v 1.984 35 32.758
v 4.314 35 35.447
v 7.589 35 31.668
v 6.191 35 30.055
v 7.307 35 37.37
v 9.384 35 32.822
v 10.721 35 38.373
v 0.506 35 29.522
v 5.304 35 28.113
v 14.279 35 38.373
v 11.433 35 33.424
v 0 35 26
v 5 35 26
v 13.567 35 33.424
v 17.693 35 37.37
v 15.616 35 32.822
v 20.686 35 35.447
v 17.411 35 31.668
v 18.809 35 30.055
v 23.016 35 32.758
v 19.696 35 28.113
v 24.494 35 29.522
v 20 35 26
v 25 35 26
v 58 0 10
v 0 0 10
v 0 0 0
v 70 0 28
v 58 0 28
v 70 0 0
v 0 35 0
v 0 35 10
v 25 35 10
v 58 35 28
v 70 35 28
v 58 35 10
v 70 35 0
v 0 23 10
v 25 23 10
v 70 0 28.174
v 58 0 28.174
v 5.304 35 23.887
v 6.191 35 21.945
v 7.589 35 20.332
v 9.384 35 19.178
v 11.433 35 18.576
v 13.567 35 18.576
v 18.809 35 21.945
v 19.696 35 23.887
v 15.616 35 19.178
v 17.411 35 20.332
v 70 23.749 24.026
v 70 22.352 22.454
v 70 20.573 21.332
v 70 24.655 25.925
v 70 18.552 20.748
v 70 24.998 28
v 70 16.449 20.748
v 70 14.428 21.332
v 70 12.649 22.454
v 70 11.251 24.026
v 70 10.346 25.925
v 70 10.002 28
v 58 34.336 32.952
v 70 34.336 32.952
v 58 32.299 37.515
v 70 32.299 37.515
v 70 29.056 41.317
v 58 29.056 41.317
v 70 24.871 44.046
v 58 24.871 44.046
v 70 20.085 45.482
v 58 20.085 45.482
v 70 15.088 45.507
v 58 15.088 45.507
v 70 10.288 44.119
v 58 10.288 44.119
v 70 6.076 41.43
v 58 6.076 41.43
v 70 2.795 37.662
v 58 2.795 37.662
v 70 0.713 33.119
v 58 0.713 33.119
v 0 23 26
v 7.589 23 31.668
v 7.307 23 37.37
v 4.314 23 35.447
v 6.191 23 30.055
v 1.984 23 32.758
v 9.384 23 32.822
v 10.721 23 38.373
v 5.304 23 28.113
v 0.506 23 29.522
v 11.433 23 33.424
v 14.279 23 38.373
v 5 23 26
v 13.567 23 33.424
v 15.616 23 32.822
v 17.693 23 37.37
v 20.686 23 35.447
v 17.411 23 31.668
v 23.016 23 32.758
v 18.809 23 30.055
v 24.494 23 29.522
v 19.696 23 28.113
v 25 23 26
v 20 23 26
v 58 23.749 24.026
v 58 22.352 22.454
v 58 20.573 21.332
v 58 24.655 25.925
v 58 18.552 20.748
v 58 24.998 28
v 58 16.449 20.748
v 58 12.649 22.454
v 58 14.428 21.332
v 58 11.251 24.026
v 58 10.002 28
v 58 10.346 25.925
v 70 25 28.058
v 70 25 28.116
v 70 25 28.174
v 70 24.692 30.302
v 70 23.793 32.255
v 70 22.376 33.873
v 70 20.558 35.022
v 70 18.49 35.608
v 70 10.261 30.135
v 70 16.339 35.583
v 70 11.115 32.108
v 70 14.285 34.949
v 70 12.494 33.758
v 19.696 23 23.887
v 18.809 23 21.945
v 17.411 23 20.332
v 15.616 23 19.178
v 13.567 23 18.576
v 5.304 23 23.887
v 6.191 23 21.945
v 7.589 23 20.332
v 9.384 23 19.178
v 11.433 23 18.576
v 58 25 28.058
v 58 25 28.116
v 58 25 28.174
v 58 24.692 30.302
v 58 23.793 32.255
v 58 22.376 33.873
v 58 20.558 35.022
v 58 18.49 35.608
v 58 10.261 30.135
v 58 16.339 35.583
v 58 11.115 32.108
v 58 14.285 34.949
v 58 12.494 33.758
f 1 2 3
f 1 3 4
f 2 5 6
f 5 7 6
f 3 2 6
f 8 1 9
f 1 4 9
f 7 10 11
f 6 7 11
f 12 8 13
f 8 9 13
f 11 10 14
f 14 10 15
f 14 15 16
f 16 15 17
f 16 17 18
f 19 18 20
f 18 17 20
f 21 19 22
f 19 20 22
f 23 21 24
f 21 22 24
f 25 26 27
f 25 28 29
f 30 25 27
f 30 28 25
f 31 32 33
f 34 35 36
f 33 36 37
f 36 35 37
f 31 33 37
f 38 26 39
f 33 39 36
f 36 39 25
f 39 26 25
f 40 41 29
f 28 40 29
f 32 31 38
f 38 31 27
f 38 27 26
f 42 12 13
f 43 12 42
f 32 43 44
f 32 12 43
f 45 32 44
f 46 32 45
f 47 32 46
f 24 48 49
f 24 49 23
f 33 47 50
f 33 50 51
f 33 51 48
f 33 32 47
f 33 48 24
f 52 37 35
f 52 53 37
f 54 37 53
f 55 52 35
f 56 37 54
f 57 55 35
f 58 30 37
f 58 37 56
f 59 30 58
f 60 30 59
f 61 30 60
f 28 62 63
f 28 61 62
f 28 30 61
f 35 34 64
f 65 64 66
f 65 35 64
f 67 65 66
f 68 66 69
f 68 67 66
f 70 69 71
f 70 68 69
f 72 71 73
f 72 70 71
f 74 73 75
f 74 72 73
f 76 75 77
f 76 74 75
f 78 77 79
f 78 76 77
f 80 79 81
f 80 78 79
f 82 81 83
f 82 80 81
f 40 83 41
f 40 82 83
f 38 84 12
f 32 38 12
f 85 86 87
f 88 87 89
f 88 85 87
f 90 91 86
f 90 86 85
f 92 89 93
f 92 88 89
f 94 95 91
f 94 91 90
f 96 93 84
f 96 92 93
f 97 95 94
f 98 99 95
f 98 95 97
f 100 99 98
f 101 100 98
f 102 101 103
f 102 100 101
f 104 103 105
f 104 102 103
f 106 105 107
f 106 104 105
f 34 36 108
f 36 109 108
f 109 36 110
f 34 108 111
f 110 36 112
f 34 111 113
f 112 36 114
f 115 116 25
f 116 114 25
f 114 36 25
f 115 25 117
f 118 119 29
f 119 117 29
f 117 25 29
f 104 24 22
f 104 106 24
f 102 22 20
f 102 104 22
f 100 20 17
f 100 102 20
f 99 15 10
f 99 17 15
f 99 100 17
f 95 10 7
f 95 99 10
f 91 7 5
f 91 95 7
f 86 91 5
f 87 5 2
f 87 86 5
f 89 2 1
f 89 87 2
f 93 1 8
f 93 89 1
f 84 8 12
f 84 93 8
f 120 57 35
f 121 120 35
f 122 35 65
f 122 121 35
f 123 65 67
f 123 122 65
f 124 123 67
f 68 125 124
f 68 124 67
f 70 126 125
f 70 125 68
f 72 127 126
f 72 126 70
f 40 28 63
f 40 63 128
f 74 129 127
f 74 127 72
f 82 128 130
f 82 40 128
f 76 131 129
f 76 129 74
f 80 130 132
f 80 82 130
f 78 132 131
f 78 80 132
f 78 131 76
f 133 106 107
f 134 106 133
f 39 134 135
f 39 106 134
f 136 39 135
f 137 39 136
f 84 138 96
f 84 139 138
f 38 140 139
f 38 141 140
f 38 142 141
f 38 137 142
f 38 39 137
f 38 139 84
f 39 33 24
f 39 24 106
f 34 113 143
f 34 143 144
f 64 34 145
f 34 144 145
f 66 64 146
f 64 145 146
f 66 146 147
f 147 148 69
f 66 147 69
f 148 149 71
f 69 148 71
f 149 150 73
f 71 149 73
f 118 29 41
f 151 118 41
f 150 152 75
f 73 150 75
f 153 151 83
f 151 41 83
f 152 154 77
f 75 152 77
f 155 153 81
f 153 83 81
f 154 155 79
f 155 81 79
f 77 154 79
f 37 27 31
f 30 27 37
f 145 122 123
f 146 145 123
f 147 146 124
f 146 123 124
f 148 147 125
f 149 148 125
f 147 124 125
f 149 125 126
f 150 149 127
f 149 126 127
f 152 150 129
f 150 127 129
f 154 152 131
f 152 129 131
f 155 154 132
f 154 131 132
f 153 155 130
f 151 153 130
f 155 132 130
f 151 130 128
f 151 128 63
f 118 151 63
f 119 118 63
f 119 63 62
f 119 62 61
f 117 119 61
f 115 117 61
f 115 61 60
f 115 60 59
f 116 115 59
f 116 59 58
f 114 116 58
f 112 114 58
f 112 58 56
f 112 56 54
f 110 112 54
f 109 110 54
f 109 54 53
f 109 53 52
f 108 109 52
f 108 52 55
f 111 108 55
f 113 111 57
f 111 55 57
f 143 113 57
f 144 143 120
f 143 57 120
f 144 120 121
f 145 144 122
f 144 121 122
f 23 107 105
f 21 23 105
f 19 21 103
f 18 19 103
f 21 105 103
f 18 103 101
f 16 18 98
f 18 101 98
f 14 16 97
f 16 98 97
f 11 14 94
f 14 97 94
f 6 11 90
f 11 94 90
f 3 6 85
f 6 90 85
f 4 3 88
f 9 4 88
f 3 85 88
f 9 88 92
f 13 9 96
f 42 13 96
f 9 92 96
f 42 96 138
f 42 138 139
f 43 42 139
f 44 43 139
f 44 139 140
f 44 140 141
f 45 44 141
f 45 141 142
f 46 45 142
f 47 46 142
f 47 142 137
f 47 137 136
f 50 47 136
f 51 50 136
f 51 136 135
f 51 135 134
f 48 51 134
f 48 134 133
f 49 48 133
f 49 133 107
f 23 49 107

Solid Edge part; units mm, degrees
sketch "Sketch1" plane through (0, 0, 0) normal (0, -1, 0) x (1, 0, 0)
  line L0 (0, 0) -> (70, 0)
  line L1 (70, 0) -> (70, 28)
  line L2 (70, 28) -> (58, 28)
  line L3 (58, 10) -> (58, 28)
  line L4 (0, 10) -> (58, 10)
  line L5 (0, 0) -> (0, 10)
extrude "Protrusion1" add sketch "Sketch1" against normal blind 35
sketch "Sketch2" plane through (70, 17.5, 14) normal (1, 0, 0) x (0, 1, 0)
  arc A0 (-17.5, 14.1736) -> (17.5, 14) centre (0.0004, 14.1736) cw
extrude "ExtrudedProtrusion_2" add sketch "Sketch2" against normal blind 12 material side at (70, 17.587, 45.6238)
sketch "Sketch3" plane through (29, 17.5, 10) normal (0, 0, 1) x (1, 0, 0)
  line L0 (-4, 17.5) -> (-4, 5.5)
  line L1 (-4, 5.5) -> (-29, 5.5)
  line L2 (-29, 5.5) -> (-29, 17.5)
  line L3 (-29, 17.5) -> (-4, 17.5)
extrude "ExtrudedProtrusion_3" add sketch "Sketch3" along normal blind 16
sketch "Sketch4" plane through (12.5, 23, 18) normal (0, -1, 0) x (1, 0, 0)
  arc A0 (-12.5, 8) -> (12.5, 8) centre (0, 8) cw
extrude "ExtrudedProtrusion_4" add sketch "Sketch4" against normal blind 12 material side at (12.5, 23, 38.45)
sketch "Sketch5" plane through (12.5, 23, 24.25) normal (0, -1, 0) x (1, 0, 0)
  circle A0 centre (0, 1.75) radius 7.5
extrude "ExtrudedCutout_1" cut sketch "Sketch5" against normal blind 108.8355
sketch "Sketch6" plane through (70, 17.5004, 22.837) normal (1, 0, 0) x (0, 1, 0)
  circle A0 centre (0, 5.3366) radius 7.5
extrude "ExtrudedCutout_2" cut sketch "Sketch6" against normal blind 24.048
